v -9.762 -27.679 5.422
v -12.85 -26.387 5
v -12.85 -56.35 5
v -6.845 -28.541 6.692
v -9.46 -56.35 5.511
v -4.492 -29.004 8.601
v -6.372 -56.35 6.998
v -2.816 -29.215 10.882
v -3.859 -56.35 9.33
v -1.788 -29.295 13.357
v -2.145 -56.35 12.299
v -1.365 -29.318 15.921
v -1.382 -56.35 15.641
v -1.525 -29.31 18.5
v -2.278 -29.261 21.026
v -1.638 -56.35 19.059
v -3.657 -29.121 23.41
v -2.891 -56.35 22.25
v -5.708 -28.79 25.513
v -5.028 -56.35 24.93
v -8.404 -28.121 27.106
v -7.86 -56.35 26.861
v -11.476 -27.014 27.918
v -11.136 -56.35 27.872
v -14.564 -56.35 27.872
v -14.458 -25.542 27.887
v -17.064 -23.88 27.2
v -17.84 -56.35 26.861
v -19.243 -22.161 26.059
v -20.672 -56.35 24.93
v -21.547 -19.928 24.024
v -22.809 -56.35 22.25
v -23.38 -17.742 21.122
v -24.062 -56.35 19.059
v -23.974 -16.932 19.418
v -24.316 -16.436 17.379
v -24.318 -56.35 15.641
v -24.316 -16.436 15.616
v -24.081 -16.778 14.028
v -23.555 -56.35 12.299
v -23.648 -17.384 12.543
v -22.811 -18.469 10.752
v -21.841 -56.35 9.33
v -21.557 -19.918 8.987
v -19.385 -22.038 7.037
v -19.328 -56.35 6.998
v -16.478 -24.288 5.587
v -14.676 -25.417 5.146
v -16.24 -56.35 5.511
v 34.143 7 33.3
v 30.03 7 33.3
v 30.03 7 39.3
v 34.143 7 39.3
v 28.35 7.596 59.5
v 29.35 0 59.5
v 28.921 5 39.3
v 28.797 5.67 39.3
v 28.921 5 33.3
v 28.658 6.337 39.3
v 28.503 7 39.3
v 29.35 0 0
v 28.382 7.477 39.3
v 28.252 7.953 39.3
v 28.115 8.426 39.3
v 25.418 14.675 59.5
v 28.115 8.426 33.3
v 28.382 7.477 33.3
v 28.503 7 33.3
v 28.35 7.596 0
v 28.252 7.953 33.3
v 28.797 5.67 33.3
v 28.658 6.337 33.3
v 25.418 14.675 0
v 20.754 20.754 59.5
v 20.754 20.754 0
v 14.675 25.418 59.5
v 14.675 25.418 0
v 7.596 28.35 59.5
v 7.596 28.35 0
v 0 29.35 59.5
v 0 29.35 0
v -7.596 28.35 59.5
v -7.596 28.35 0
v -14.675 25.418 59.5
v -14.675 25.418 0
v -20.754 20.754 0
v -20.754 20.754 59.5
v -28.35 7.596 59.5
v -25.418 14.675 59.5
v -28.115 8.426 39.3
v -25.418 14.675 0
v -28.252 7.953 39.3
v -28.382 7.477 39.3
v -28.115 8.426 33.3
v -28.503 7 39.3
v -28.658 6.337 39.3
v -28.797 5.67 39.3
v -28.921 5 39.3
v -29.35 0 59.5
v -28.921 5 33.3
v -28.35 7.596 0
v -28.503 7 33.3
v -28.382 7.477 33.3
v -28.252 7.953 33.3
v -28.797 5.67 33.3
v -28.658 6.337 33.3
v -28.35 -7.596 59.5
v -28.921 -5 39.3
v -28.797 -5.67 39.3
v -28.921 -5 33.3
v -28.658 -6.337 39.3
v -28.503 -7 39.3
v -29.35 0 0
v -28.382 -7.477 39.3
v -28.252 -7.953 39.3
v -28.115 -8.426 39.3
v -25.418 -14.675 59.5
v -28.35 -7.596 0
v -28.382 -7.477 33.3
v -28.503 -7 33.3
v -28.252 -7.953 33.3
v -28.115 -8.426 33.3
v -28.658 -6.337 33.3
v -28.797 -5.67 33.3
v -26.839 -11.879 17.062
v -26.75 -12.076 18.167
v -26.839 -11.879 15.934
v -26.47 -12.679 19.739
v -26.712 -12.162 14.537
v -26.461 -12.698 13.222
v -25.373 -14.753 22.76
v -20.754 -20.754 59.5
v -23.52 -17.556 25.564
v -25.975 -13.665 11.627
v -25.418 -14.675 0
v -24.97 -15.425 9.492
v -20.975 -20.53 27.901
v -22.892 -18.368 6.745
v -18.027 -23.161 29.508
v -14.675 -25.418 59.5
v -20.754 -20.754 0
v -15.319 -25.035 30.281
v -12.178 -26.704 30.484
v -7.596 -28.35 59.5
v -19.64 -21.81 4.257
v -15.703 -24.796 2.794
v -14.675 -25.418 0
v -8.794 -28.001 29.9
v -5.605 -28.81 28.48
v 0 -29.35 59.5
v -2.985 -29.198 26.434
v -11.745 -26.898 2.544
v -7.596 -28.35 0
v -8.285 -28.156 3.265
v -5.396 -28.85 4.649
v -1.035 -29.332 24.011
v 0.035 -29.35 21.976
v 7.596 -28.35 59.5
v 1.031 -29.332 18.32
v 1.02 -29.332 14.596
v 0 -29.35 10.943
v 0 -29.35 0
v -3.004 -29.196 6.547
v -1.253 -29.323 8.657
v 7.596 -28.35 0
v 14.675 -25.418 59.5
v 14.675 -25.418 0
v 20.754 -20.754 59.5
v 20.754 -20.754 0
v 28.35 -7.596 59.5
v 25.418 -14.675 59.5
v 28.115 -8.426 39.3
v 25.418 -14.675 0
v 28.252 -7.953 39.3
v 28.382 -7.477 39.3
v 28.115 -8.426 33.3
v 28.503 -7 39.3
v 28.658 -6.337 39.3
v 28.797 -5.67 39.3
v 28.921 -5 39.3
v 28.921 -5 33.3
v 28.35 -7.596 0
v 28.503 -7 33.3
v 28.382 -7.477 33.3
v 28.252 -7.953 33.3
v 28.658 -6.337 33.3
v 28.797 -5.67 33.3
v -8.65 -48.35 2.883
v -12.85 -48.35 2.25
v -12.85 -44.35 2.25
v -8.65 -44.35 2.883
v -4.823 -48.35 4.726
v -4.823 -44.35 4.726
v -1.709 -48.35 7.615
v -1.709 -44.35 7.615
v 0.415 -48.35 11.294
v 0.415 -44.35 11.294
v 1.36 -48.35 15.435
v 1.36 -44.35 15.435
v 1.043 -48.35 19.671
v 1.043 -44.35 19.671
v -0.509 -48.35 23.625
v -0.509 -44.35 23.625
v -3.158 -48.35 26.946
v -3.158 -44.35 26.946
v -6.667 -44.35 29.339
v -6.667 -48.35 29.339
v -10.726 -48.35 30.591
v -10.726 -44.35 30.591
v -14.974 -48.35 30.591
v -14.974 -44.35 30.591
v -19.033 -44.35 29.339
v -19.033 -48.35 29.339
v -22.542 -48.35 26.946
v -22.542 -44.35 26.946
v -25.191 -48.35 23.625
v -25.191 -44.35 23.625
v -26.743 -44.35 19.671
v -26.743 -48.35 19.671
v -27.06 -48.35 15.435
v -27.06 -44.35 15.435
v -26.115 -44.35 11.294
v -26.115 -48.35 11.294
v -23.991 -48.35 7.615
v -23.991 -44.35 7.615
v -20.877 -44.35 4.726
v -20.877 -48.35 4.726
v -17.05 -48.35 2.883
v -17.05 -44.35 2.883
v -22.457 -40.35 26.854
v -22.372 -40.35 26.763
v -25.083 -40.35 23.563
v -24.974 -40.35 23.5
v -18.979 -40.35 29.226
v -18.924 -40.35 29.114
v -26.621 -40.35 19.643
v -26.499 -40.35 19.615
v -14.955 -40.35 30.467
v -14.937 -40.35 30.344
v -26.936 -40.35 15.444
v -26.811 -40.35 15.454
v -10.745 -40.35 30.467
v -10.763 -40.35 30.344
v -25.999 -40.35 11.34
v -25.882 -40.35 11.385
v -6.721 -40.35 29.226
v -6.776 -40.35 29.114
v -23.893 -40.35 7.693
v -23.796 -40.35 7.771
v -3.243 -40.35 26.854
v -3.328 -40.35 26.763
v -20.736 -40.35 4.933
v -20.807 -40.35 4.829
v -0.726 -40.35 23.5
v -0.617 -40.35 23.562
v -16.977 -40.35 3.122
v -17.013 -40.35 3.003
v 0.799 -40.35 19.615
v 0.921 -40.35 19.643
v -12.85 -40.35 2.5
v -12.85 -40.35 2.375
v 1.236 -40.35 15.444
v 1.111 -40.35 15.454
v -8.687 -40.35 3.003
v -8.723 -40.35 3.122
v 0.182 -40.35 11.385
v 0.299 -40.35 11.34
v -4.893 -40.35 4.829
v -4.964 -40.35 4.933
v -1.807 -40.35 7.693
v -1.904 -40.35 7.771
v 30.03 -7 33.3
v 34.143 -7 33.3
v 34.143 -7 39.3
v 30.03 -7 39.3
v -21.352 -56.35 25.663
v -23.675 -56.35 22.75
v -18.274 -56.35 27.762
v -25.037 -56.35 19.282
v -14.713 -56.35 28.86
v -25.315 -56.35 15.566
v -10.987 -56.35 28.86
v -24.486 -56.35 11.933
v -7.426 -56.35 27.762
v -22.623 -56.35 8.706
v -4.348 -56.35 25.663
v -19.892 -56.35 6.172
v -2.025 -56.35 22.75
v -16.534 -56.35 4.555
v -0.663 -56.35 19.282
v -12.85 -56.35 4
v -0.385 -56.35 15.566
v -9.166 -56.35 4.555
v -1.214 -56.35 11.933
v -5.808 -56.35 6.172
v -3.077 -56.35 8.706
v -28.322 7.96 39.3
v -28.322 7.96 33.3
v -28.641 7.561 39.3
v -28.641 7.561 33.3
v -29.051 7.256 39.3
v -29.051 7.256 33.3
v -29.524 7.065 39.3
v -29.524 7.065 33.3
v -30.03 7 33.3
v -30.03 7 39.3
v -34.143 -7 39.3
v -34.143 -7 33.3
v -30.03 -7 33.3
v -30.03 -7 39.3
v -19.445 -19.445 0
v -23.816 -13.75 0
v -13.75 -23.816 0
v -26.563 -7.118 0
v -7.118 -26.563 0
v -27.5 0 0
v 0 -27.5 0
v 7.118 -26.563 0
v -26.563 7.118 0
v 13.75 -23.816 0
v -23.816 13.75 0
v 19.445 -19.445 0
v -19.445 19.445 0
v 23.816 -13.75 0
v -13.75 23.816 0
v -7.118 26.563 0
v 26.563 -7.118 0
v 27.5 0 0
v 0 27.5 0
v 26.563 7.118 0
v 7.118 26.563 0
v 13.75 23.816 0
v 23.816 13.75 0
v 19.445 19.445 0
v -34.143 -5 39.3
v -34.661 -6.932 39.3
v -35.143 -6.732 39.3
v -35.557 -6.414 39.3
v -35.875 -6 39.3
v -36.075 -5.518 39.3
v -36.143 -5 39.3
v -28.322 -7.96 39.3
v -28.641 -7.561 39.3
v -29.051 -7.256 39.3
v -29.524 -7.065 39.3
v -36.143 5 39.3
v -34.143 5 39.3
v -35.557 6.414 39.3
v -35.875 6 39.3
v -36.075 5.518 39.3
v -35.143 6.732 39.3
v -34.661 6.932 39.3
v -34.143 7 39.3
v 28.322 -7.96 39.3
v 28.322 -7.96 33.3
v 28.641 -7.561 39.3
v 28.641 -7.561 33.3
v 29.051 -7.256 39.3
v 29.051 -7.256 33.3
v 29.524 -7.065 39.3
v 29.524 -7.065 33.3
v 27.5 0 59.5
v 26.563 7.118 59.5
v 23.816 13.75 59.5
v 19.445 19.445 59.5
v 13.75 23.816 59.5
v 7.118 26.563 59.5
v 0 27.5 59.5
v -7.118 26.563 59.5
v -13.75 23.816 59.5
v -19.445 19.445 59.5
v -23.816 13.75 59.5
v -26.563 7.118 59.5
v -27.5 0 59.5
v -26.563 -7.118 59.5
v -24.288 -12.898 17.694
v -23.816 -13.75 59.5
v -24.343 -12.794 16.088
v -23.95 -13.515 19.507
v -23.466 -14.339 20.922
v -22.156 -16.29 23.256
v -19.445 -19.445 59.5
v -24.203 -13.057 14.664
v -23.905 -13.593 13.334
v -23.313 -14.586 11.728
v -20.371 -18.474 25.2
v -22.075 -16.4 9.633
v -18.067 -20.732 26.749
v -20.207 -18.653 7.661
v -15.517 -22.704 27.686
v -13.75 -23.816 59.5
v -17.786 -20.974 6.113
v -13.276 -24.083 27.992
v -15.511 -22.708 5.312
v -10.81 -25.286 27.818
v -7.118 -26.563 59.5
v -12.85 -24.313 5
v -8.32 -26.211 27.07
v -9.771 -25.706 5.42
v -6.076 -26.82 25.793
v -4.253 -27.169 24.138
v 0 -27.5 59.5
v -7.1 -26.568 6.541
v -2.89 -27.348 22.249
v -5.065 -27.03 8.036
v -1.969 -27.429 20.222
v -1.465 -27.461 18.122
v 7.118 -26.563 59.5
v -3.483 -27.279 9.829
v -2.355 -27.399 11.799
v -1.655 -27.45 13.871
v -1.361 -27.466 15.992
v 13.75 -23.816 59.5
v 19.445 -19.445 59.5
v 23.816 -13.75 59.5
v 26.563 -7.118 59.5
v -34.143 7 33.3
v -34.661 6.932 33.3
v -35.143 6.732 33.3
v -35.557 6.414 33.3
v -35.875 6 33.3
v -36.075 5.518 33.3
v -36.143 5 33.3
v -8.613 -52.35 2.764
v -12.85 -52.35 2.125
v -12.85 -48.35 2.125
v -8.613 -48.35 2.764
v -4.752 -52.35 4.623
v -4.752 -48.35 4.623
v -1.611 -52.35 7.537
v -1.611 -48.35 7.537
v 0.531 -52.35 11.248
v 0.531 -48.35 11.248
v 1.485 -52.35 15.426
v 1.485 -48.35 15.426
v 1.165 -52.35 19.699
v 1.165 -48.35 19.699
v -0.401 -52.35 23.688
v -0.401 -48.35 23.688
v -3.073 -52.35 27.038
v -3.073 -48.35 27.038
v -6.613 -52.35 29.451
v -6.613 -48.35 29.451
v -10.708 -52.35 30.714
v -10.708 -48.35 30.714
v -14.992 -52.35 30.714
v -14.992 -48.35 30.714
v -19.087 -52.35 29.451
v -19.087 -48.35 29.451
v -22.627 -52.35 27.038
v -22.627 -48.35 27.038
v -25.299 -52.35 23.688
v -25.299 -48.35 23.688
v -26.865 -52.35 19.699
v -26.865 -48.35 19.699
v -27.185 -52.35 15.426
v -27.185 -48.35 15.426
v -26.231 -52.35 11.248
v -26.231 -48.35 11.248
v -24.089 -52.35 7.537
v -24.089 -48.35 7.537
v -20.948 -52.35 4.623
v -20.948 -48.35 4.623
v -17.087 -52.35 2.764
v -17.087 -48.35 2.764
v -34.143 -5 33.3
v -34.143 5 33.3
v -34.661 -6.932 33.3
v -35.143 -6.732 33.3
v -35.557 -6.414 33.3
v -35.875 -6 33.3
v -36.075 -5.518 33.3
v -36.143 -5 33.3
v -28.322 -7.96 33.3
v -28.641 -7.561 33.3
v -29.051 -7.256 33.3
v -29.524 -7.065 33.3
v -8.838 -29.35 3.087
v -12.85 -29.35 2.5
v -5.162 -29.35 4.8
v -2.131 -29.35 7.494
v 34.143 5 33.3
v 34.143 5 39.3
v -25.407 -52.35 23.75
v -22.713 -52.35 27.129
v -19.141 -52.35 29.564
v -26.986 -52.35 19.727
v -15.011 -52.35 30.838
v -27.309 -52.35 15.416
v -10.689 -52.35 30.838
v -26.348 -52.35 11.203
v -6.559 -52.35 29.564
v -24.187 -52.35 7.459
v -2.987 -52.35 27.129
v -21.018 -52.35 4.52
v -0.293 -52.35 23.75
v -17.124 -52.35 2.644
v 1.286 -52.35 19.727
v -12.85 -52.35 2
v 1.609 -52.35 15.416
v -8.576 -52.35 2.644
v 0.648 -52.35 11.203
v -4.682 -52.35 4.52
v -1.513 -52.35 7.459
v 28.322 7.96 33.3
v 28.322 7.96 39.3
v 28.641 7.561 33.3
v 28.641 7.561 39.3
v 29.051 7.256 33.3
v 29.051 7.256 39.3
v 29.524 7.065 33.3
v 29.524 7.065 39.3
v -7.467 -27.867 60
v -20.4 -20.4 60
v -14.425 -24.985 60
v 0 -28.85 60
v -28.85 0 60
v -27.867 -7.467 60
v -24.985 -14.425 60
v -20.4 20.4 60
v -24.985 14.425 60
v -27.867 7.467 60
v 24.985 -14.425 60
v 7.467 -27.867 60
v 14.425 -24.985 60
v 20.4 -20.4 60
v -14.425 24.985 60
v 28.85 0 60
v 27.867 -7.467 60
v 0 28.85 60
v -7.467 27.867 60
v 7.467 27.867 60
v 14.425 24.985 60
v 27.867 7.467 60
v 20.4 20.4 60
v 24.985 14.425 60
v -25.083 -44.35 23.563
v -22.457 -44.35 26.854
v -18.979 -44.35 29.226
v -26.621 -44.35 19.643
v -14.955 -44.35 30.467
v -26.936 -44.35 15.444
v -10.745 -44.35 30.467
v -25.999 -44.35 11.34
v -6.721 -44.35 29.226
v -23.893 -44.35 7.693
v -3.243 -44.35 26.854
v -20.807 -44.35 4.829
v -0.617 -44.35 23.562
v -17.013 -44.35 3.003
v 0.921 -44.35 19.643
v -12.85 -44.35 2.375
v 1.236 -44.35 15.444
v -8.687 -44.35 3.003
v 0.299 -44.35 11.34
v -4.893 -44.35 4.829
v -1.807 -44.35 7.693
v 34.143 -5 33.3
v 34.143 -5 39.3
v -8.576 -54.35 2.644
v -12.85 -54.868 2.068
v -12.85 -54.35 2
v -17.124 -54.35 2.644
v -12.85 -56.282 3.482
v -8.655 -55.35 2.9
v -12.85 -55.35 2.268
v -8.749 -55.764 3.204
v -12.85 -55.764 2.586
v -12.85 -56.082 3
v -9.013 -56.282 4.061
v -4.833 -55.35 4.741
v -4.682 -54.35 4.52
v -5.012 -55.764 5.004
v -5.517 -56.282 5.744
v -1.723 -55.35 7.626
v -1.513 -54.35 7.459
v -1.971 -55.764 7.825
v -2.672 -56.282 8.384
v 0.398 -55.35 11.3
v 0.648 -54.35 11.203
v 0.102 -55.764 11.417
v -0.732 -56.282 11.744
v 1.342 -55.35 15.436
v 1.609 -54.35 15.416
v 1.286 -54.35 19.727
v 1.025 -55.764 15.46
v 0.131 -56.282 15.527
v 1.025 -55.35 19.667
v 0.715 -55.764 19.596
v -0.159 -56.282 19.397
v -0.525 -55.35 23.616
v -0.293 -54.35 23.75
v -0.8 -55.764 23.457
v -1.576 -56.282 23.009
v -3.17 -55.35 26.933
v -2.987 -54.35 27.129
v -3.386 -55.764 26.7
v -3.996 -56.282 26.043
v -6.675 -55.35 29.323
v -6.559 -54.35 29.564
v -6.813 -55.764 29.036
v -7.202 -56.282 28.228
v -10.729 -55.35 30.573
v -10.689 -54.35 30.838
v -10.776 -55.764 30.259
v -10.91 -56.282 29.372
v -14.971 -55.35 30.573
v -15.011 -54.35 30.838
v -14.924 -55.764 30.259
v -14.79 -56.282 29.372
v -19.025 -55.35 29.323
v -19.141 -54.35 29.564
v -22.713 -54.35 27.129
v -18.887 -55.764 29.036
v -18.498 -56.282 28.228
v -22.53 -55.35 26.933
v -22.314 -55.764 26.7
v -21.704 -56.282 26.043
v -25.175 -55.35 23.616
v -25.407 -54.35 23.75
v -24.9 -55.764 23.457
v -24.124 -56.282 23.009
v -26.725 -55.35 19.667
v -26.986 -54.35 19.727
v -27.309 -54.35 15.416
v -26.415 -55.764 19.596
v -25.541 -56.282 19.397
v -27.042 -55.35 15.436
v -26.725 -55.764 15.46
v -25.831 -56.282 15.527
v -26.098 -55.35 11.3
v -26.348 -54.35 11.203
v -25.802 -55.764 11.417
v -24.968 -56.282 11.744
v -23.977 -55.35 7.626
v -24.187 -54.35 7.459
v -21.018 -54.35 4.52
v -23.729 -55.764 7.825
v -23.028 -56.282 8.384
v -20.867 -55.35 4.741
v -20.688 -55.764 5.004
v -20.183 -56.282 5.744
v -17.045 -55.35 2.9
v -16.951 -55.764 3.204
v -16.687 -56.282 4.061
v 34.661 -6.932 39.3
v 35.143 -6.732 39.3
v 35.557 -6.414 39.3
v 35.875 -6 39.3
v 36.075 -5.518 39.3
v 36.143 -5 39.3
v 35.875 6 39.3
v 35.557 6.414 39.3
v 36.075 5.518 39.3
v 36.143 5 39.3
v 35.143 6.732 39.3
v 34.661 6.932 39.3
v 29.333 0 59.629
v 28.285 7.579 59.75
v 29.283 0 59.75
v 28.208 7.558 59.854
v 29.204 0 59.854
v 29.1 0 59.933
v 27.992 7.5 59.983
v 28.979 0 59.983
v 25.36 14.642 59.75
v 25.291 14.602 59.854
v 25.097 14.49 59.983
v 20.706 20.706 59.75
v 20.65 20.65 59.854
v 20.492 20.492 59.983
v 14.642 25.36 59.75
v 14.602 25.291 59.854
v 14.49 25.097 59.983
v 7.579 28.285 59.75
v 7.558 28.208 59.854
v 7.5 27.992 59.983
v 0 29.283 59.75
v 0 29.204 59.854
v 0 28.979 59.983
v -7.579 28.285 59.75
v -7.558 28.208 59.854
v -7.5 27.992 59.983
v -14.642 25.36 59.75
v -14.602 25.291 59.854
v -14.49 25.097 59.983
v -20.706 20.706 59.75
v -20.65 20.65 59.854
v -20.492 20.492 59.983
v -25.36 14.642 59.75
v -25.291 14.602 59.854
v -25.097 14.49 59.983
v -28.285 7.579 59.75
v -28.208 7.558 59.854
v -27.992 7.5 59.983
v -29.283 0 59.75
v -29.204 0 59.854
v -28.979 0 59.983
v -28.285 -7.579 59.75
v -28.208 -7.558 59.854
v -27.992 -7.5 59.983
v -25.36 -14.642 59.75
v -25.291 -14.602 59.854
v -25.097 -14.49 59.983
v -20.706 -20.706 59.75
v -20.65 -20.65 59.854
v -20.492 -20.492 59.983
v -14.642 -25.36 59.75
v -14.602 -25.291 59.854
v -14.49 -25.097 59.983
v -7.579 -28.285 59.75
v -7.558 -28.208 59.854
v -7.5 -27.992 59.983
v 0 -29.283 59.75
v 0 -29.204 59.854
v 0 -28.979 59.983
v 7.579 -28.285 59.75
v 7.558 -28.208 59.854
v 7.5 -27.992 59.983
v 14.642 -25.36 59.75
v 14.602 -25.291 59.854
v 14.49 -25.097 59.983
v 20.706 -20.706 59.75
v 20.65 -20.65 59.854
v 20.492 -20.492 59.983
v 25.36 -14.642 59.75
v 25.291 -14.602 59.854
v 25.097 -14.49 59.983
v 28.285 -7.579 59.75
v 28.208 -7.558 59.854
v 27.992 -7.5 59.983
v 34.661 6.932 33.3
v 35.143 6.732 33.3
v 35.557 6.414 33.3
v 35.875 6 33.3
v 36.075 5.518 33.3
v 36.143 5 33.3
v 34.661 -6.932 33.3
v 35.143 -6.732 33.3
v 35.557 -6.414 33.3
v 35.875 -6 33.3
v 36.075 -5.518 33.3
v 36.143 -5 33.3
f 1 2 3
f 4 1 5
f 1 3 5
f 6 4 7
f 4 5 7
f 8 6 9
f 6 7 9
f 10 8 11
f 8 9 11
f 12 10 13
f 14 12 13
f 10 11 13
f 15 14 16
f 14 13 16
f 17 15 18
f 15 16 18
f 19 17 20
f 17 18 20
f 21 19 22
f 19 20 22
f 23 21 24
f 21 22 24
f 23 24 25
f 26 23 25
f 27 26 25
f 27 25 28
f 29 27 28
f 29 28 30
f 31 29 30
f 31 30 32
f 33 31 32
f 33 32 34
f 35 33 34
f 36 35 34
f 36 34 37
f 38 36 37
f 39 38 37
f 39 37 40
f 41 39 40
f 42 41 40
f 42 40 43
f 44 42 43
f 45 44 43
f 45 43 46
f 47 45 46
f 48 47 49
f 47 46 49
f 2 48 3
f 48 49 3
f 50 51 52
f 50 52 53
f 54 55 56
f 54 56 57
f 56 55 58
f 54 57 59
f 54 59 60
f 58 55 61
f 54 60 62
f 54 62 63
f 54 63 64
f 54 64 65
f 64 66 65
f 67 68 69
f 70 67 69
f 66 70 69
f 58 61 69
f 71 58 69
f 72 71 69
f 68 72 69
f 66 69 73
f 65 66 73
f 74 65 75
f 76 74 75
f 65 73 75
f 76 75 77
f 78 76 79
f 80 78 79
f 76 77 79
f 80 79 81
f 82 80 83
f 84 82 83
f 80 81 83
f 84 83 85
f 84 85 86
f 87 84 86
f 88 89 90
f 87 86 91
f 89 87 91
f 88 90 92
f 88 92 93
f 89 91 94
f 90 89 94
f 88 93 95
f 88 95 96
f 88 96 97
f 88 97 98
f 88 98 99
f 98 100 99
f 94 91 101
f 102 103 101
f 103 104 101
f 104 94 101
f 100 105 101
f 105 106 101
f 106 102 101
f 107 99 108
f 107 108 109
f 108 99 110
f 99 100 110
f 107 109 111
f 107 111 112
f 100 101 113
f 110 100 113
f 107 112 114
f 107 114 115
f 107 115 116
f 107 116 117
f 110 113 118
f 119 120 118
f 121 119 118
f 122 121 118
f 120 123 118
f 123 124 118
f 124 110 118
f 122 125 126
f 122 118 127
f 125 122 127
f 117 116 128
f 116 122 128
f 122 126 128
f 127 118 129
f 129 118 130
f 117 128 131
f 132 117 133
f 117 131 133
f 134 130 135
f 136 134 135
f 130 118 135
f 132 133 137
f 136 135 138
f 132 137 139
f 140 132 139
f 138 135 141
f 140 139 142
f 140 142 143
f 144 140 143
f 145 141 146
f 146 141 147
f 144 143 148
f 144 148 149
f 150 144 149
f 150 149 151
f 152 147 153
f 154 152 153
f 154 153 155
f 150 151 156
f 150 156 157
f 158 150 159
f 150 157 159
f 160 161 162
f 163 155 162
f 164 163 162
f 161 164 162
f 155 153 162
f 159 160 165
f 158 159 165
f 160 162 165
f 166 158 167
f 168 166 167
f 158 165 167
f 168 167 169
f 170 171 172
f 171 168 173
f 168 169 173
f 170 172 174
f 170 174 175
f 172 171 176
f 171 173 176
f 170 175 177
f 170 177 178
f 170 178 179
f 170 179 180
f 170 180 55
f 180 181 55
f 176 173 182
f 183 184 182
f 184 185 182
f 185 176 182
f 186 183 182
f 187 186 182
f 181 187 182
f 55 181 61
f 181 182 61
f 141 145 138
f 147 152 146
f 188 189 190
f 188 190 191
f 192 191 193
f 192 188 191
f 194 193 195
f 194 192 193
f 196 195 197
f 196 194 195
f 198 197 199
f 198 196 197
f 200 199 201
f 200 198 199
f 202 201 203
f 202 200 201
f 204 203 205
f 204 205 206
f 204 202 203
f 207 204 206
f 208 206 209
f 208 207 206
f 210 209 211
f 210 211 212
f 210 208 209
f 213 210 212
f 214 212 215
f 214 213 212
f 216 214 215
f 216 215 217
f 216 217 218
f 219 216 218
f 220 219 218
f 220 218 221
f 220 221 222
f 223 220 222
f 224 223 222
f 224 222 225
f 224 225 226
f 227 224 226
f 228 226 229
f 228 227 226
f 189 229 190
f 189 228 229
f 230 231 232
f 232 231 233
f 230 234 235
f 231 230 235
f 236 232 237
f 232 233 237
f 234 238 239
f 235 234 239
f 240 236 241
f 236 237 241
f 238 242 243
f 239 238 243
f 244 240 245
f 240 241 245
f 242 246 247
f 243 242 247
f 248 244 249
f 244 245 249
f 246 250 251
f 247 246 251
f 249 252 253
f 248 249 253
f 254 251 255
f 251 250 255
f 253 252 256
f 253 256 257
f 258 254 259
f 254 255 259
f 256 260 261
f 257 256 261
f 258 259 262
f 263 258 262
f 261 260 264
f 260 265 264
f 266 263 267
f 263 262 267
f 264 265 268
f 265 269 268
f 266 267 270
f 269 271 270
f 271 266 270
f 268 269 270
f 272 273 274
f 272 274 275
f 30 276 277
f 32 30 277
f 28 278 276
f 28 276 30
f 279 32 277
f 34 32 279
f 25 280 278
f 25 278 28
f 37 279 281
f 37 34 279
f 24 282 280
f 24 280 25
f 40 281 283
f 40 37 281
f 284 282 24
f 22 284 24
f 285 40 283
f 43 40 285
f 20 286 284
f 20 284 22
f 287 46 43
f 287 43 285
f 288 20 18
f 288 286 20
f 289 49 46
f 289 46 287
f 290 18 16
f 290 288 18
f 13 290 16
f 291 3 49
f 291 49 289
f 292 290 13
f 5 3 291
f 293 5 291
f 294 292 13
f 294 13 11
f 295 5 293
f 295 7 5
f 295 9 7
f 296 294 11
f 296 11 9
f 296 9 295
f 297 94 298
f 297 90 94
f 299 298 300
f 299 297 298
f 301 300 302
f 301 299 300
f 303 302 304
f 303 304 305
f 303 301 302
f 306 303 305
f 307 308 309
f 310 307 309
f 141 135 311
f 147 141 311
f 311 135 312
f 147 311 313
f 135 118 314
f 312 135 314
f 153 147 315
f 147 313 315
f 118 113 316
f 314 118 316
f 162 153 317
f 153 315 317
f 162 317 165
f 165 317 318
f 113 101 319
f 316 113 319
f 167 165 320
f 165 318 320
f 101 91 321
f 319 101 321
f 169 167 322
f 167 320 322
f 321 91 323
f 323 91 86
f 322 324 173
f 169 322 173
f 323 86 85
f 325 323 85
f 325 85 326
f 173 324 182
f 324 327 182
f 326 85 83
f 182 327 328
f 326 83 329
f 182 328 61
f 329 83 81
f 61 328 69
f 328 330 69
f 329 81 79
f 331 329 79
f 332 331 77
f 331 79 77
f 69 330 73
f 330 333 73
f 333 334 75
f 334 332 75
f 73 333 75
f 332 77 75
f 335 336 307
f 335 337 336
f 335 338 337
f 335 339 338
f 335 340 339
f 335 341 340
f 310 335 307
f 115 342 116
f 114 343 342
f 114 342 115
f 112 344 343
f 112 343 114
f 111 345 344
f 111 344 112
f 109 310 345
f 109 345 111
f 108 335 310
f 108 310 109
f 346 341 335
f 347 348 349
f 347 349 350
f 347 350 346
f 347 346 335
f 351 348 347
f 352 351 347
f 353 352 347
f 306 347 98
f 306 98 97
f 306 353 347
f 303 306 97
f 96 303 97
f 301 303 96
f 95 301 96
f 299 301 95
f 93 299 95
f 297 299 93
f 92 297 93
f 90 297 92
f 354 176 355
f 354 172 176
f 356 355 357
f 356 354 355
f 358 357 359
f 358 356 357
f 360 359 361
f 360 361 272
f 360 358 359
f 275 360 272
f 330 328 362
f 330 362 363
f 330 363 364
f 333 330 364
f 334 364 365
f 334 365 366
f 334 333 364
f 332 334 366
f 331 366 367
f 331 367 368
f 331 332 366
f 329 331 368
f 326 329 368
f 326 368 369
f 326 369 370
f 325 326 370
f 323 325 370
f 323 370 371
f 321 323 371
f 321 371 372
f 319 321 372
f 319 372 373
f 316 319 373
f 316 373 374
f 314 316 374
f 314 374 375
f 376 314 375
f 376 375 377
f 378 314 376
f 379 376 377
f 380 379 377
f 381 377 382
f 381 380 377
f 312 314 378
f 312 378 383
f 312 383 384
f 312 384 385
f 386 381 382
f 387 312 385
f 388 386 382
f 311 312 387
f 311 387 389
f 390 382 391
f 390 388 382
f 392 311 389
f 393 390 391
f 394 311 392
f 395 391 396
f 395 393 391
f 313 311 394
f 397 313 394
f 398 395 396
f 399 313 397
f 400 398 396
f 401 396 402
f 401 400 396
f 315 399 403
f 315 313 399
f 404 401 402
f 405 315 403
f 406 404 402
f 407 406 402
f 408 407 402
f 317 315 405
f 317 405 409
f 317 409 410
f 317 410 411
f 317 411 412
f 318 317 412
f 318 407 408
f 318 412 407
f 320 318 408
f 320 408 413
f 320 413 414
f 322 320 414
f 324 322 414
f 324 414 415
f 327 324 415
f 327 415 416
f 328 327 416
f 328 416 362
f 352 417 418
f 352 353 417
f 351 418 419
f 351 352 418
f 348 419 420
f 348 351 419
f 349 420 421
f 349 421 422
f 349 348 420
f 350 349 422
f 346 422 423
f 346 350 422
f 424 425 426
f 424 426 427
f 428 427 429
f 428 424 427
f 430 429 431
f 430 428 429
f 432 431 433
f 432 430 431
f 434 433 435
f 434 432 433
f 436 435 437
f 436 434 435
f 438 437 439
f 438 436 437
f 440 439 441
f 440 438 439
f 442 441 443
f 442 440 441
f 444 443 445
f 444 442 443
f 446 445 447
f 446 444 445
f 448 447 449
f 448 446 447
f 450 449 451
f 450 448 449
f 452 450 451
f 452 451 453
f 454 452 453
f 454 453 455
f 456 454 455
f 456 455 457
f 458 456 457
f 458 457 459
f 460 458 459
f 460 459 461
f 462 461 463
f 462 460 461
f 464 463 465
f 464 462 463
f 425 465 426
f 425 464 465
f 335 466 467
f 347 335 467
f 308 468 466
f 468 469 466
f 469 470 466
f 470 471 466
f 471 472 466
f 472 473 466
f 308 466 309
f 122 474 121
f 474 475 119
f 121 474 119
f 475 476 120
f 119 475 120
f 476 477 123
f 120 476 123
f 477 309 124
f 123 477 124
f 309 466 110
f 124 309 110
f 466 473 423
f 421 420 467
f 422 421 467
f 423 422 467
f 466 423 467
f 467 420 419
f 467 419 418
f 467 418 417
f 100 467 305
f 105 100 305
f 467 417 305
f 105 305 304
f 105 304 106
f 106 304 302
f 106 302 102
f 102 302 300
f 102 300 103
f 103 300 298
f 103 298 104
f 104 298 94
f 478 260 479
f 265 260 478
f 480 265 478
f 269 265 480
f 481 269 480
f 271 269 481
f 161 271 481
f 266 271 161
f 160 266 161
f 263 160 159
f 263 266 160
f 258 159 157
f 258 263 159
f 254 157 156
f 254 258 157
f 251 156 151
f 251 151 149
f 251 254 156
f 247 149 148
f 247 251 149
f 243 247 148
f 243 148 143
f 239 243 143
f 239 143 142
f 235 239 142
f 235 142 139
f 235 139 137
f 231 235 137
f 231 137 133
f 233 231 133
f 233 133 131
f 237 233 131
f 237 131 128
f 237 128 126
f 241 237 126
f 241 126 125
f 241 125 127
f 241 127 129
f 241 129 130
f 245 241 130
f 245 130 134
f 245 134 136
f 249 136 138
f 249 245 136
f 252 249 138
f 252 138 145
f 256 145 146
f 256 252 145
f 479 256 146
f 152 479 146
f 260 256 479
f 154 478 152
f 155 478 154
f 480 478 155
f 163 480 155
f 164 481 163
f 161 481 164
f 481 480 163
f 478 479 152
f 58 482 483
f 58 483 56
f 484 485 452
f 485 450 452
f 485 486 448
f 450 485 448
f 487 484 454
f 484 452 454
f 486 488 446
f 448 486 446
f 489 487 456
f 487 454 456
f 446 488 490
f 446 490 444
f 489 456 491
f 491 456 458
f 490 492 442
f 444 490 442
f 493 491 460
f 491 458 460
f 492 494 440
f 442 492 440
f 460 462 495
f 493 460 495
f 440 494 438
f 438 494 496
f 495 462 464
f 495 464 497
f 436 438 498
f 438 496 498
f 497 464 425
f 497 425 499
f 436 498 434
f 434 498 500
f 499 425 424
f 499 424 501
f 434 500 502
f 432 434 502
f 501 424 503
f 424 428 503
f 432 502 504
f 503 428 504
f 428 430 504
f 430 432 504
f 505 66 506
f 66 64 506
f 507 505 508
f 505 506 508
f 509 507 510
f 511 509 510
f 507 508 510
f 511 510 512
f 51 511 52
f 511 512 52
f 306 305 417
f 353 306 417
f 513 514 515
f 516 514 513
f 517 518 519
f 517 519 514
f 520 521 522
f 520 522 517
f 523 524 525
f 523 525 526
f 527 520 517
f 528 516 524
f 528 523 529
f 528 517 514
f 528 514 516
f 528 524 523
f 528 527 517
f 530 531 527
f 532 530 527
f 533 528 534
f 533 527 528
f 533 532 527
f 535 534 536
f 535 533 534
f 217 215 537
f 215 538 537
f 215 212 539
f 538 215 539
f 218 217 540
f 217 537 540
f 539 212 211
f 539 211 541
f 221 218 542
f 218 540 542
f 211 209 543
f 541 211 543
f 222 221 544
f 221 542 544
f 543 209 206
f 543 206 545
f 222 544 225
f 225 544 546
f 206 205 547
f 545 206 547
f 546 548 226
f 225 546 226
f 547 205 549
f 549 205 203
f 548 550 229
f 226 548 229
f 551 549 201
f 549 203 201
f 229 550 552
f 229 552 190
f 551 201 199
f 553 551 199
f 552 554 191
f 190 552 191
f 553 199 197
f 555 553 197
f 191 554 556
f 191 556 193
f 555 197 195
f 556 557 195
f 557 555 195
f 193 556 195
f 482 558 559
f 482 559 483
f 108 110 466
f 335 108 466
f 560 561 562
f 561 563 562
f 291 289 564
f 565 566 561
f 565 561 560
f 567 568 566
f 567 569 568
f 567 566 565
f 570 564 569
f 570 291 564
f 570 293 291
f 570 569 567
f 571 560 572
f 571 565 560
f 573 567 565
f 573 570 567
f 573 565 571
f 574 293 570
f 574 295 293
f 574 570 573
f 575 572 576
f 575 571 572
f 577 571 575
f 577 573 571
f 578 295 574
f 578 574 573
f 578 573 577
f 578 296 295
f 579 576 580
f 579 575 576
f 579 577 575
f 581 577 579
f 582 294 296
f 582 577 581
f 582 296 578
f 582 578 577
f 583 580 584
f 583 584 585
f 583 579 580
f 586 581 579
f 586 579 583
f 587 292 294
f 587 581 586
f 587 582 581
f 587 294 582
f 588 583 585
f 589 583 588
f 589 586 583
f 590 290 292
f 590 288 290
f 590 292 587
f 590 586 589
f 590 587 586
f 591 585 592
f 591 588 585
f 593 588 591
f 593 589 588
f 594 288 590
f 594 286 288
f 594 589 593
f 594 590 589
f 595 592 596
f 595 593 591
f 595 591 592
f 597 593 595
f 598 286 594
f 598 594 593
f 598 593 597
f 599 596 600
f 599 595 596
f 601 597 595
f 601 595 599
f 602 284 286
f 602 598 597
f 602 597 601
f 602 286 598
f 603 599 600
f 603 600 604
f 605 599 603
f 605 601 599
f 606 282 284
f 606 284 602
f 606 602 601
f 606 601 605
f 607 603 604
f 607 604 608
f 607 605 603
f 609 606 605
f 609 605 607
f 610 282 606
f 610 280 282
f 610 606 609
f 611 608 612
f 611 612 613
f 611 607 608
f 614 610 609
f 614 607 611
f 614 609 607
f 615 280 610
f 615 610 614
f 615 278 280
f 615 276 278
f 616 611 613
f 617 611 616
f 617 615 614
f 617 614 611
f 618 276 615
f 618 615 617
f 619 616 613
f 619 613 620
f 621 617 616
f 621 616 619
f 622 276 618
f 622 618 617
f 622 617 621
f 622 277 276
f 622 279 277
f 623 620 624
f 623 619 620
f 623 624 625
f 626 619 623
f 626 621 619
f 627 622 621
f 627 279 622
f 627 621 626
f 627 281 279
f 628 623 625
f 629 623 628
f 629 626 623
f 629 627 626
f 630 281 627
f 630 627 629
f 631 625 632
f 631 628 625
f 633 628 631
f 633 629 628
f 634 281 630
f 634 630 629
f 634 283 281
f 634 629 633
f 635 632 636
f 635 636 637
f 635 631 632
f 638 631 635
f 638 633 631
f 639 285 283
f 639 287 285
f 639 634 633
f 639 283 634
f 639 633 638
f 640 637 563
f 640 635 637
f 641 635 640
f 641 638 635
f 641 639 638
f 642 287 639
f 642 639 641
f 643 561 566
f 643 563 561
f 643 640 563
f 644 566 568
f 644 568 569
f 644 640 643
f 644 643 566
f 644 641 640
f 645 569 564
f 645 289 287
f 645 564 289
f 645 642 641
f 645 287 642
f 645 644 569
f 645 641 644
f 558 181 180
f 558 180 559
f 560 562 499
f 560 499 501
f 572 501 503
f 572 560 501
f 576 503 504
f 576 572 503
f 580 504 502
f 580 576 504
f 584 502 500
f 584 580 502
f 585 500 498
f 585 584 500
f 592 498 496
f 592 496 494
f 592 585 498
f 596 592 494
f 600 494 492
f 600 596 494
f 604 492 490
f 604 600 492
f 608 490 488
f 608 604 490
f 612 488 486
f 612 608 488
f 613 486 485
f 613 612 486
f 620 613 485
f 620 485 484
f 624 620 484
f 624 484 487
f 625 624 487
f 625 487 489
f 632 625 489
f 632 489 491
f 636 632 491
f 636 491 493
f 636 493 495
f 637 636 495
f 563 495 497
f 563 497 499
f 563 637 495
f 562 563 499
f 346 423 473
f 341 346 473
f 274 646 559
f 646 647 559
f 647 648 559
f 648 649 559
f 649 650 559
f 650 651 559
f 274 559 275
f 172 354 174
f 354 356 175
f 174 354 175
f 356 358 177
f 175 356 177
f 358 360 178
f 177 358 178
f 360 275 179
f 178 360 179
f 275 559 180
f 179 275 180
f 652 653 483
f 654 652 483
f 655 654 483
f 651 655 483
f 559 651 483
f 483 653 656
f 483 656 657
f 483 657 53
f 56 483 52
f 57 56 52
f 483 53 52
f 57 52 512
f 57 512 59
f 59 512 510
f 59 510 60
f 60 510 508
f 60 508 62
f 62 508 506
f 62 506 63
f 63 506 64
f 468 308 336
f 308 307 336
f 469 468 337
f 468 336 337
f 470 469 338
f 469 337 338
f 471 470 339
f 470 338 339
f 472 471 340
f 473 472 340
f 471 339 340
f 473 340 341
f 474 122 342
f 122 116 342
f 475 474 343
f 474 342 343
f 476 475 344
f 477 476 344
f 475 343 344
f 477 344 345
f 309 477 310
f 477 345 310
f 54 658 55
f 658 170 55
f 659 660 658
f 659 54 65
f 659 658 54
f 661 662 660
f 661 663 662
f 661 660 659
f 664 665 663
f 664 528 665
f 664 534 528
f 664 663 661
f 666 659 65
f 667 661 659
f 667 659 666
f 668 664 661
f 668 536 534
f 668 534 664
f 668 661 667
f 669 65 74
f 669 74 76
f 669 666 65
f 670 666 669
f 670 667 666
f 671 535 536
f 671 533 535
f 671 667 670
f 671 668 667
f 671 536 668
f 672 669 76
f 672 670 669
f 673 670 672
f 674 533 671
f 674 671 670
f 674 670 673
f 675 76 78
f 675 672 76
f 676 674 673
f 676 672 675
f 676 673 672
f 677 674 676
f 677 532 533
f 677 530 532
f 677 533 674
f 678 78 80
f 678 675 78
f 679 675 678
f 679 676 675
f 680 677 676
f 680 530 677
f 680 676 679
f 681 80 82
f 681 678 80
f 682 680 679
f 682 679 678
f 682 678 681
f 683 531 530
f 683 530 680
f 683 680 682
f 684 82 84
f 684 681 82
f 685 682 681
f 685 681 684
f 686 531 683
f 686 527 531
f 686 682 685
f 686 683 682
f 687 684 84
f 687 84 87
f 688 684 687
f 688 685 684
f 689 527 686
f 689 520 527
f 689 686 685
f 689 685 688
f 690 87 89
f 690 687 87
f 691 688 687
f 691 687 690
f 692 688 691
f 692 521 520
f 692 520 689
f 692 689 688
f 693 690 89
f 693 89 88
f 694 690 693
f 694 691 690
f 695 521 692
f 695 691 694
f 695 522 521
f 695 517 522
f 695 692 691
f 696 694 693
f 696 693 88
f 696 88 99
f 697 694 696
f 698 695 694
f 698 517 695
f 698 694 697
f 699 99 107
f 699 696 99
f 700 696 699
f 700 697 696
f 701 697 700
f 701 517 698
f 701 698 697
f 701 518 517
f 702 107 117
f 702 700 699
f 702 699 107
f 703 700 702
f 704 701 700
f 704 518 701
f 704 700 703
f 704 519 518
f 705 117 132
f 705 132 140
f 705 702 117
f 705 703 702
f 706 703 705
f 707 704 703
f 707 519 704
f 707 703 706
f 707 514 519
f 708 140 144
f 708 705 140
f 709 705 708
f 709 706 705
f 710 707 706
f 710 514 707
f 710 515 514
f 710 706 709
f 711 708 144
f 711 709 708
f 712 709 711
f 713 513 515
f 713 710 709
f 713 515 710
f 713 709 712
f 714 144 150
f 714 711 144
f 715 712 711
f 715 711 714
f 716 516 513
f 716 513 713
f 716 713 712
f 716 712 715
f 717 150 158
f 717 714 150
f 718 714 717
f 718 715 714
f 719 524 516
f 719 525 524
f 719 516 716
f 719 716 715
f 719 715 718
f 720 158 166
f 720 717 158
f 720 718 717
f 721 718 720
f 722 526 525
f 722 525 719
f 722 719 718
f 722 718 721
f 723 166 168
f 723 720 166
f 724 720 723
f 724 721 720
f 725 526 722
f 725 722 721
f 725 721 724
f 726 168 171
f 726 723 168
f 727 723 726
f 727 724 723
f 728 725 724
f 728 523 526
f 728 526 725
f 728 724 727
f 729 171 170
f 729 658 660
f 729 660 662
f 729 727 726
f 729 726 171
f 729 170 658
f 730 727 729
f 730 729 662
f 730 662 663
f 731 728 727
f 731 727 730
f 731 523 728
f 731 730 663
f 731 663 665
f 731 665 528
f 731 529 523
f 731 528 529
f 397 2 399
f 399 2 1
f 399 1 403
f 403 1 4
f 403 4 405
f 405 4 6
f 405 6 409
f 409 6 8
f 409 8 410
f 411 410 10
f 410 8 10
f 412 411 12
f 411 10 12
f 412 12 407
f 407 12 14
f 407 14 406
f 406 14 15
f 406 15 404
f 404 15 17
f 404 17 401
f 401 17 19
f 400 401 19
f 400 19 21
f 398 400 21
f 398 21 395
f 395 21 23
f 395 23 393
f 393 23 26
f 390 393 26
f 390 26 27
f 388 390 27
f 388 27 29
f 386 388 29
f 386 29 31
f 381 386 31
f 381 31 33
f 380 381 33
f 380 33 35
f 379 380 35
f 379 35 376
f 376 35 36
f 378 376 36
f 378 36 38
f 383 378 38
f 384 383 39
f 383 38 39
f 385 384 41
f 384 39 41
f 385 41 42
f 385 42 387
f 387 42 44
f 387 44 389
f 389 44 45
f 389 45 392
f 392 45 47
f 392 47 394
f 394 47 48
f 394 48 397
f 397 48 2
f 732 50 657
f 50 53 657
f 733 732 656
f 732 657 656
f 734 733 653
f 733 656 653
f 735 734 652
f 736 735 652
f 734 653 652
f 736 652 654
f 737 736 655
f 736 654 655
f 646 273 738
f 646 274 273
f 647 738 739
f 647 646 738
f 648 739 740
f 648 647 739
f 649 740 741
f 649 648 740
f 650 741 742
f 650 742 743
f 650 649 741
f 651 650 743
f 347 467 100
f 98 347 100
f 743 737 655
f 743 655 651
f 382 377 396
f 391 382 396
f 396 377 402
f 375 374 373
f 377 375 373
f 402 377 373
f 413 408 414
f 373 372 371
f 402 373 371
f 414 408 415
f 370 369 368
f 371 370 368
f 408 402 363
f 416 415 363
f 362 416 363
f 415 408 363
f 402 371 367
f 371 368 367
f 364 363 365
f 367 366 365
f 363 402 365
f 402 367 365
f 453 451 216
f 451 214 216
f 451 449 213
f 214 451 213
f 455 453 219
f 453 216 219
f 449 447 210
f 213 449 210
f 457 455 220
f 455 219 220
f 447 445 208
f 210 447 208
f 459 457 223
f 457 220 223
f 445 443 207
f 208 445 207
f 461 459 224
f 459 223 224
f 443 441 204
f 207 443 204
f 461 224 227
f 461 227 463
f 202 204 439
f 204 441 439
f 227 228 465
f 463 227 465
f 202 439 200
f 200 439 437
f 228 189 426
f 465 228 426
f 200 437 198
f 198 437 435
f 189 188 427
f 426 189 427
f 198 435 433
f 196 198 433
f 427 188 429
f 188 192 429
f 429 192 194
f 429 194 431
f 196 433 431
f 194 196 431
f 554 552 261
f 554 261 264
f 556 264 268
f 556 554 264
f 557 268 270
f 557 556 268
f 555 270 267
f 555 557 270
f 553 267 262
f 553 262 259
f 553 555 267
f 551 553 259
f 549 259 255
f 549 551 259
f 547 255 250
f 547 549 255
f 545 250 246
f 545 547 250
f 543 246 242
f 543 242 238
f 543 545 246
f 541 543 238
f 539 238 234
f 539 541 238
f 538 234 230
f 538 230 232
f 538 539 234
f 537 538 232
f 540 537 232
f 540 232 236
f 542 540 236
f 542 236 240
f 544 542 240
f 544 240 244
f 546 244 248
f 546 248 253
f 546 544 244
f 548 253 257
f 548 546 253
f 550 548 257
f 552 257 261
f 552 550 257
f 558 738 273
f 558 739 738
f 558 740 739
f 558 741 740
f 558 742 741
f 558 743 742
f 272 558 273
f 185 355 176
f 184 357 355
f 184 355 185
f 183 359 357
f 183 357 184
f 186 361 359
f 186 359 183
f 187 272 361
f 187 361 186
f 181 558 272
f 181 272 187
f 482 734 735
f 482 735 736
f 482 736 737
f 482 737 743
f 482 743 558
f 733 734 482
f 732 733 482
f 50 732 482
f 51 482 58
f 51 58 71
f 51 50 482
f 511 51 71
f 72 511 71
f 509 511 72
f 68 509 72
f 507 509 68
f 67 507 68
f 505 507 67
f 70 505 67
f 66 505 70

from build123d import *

# Parameters (mm, degrees)
SKETCH1_R           = 29.35
SKETCH1_R_2         = 27.5
BOSS_EXTRUDE1_DEPTH = 60
BOSS_EXTRUDE2_DEPTH = 6
FILLET1_R           = 2
FILLET2_R           = 0.5
BOSS_EXTRUDE3_REACH = 93.389
SKETCH3_R           = 14
SKETCH3_R_2         = 11.5
BOSS_EXTRUDE4_START = 11
SKETCH3_3_R         = 14
SKETCH3_3_R_2       = 11.5
BOSS_EXTRUDE4_DEPTH = 11
BOSS_EXTRUDE5_START = 4
SKETCH4_R           = 14.125
SKETCH4_R_2         = 11.5
BOSS_EXTRUDE5_DEPTH = 4
BOSS_EXTRUDE6_START = 4
SKETCH5_R           = 14.25
SKETCH5_R_2         = 11.5
BOSS_EXTRUDE6_DEPTH = 4
BOSS_EXTRUDE7_START = 4
SKETCH6_R           = 14.375
SKETCH6_R_2         = 11.5
BOSS_EXTRUDE7_DEPTH = 4
BOSS_EXTRUDE8_START = 4
SKETCH7_R           = 14.5
SKETCH7_R_2         = 11.5
BOSS_EXTRUDE8_DEPTH = 4
FILLET3_R           = 2
CUT_EXTRUDE1_REACH  = 112.683
SKETCH8_R           = 11.5
BOSS_EXTRUDE9_START = -0.5
SKETCH9_R           = 27.5
BOSS_EXTRUDE9_DEPTH = 0.5


with BuildPart() as part:
    # Sketch1 → Boss-Extrude1 (new body)
    with BuildSketch(Plane.XY):
        Circle(SKETCH1_R)
        Circle(SKETCH1_R_2, mode=Mode.SUBTRACT)
    extrude(amount=BOSS_EXTRUDE1_DEPTH)

    # Sketch2 → Boss-Extrude2 (add)
    with BuildSketch(Plane.XY.offset(33.3)):
        with BuildLine():
            Line((-28.503026155, 7), (-36.143026155, 7))
            Line((-36.143026155, 7), (-36.143026155, -7))
            Line((-36.143026155, -7), (-28.503026155, -7))
            ThreePointArc((-28.503026155, -7), (-28.729407073, -6.003638001), (-28.920969901, -5))
            Line((-28.920969901, -5), (-34.143026155, -5))
            Line((-34.143026155, -5), (-34.143026155, 5))
            Line((-34.143026155, 5), (-28.920969901, 5))
            ThreePointArc((-28.920969901, 5), (-28.729407073, 6.003638001), (-28.503026155, 7))
        make_face()
        with BuildLine():
            Line((28.503026155, 7), (36.143026155, 7))
            Line((36.143026155, 7), (36.143026155, -7))
            Line((36.143026155, -7), (28.503026155, -7))
            ThreePointArc((28.503026155, -7), (28.729407073, -6.003638001), (28.920969901, -5))
            Line((28.920969901, -5), (34.143026155, -5))
            Line((34.143026155, -5), (34.143026155, 5))
            Line((34.143026155, 5), (28.920969901, 5))
            ThreePointArc((28.920969901, 5), (28.729407073, 6.003638001), (28.503026155, 7))
        make_face()
    extrude(amount=BOSS_EXTRUDE2_DEPTH)

    # Fillet1
    fillet1_edges = [part.edges().sort_by_distance(p)[0] for p in [
        (-28.503026155, 7, 36.3),
        (-36.143026155, 7, 36.3),
        (-36.143026155, -7, 36.3),
        (-28.503026155, -7, 36.3),
        (28.503026155, -7, 36.3),
        (36.143026155, -7, 36.3),
        (36.143026155, 7, 36.3),
        (28.503026155, 7, 36.3),
    ]]
    fillet(fillet1_edges, radius=FILLET1_R)

    # Fillet2
    fillet2_edges = [part.edges().sort_by_distance(p)[0] for p in [
        (-29.35, 0, 60),
    ]]
    fillet(fillet2_edges, radius=FILLET2_R)

    # Sketch3 → Boss-Extrude3 (add, up to next)
    with BuildSketch(Plane(origin=(0, -29.35, 0), x_dir=(-1, 0, 0), z_dir=(0, -1, 0)), mode=Mode.PRIVATE) as boss_extrude3_sk1:
        with Locations((12.85, -16.5)):
            Circle(SKETCH3_R)
        with Locations(Location((12.85, -16.5, 0), (0, 0, 90))):
            Circle(SKETCH3_R_2, mode=Mode.SUBTRACT)
    boss_extrude3_tool1 = extrude(boss_extrude3_sk1.sketch, amount=-BOSS_EXTRUDE3_REACH, mode=Mode.PRIVATE) - part.part
    add(boss_extrude3_tool1.solids().sort_by_distance((0.75402, -29.35, 16.5))[0])
    add(boss_extrude3_tool1.solids().sort_by_distance((0.75402, -29.35, 16.5))[1])

    # Sketch3<3> → Boss-Extrude4 (add)
    with BuildSketch(Plane(origin=(0, -29.35, 0), x_dir=(-1, 0, 0), z_dir=(0, -1, 0)).offset(BOSS_EXTRUDE4_START)):
        with Locations(Location((12.85, -16.5, 0), (0, 0, 90))):
            Circle(SKETCH3_3_R)
        with Locations(Location((12.85, -16.5, 0), (0, 0, 90))):
            Circle(SKETCH3_3_R_2, mode=Mode.SUBTRACT)
    extrude(amount=-BOSS_EXTRUDE4_DEPTH)

    # Sketch4 → Boss-Extrude5 (add)
    with BuildSketch(Plane(origin=(0, -40.35, 0), x_dir=(-1, 0, 0), z_dir=(0, -1, 0)).offset(BOSS_EXTRUDE5_START)):
        with Locations(Location((12.85, -16.5, 0), (0, 0, 90))):
            Circle(SKETCH4_R)
        with Locations(Location((12.85, -16.5, 0), (0, 0, 90))):
            Circle(SKETCH4_R_2, mode=Mode.SUBTRACT)
    extrude(amount=-BOSS_EXTRUDE5_DEPTH)

    # Sketch5 → Boss-Extrude6 (add)
    with BuildSketch(Plane.XZ.offset(44.35).offset(BOSS_EXTRUDE6_START)):
        with Locations(Location((-12.85, 16.5, 0), (0, 0, 270))):
            Circle(SKETCH5_R)
        with Locations(Location((-12.85, 16.5, 0), (0, 0, 270))):
            Circle(SKETCH5_R_2, mode=Mode.SUBTRACT)
    extrude(amount=-BOSS_EXTRUDE6_DEPTH)

    # Sketch6 → Boss-Extrude7 (add)
    with BuildSketch(Plane.XZ.offset(48.35).offset(BOSS_EXTRUDE7_START)):
        with Locations(Location((-12.85, 16.5, 0), (0, 0, 270))):
            Circle(SKETCH6_R)
        with Locations(Location((-12.85, 16.5, 0), (0, 0, 270))):
            Circle(SKETCH6_R_2, mode=Mode.SUBTRACT)
    extrude(amount=-BOSS_EXTRUDE7_DEPTH)

    # Sketch7 → Boss-Extrude8 (add)
    with BuildSketch(Plane(origin=(0, -52.35, 0), x_dir=(-1, 0, 0), z_dir=(0, -1, 0)).offset(BOSS_EXTRUDE8_START)):
        with Locations(Location((12.85, -16.5, 0), (0, 0, 90))):
            Circle(SKETCH7_R)
        with Locations(Location((12.85, -16.5, 0), (0, 0, 90))):
            Circle(SKETCH7_R_2, mode=Mode.SUBTRACT)
    extrude(amount=-BOSS_EXTRUDE8_DEPTH)

    # Fillet3
    fillet3_edges = [part.edges().sort_by_distance(p)[0] for p in [
        (-12.85, -56.35, 31),
    ]]
    fillet(fillet3_edges, radius=FILLET3_R)

    # Sketch8 → Cut-Extrude1 (cut, up to next)
    with BuildSketch(Plane.XZ.offset(56.35), mode=Mode.PRIVATE) as cut_extrude1_sk1:
        with Locations(Location((-12.85, 16.5, 0), (0, 0, 270))):
            Circle(SKETCH8_R)
    cut_extrude1_tool1 = extrude(cut_extrude1_sk1.sketch, amount=-CUT_EXTRUDE1_REACH, mode=Mode.PRIVATE) & part.part
    add(cut_extrude1_tool1.solids().sort_by_distance((-12.85, -56.35, 16.5))[0], mode=Mode.SUBTRACT)

    # Sketch9 → Boss-Extrude9 (add)
    with BuildSketch(Plane.XY.offset(60).offset(BOSS_EXTRUDE9_START)):
        Circle(SKETCH9_R)
    extrude(amount=BOSS_EXTRUDE9_DEPTH)


solid = part.part
